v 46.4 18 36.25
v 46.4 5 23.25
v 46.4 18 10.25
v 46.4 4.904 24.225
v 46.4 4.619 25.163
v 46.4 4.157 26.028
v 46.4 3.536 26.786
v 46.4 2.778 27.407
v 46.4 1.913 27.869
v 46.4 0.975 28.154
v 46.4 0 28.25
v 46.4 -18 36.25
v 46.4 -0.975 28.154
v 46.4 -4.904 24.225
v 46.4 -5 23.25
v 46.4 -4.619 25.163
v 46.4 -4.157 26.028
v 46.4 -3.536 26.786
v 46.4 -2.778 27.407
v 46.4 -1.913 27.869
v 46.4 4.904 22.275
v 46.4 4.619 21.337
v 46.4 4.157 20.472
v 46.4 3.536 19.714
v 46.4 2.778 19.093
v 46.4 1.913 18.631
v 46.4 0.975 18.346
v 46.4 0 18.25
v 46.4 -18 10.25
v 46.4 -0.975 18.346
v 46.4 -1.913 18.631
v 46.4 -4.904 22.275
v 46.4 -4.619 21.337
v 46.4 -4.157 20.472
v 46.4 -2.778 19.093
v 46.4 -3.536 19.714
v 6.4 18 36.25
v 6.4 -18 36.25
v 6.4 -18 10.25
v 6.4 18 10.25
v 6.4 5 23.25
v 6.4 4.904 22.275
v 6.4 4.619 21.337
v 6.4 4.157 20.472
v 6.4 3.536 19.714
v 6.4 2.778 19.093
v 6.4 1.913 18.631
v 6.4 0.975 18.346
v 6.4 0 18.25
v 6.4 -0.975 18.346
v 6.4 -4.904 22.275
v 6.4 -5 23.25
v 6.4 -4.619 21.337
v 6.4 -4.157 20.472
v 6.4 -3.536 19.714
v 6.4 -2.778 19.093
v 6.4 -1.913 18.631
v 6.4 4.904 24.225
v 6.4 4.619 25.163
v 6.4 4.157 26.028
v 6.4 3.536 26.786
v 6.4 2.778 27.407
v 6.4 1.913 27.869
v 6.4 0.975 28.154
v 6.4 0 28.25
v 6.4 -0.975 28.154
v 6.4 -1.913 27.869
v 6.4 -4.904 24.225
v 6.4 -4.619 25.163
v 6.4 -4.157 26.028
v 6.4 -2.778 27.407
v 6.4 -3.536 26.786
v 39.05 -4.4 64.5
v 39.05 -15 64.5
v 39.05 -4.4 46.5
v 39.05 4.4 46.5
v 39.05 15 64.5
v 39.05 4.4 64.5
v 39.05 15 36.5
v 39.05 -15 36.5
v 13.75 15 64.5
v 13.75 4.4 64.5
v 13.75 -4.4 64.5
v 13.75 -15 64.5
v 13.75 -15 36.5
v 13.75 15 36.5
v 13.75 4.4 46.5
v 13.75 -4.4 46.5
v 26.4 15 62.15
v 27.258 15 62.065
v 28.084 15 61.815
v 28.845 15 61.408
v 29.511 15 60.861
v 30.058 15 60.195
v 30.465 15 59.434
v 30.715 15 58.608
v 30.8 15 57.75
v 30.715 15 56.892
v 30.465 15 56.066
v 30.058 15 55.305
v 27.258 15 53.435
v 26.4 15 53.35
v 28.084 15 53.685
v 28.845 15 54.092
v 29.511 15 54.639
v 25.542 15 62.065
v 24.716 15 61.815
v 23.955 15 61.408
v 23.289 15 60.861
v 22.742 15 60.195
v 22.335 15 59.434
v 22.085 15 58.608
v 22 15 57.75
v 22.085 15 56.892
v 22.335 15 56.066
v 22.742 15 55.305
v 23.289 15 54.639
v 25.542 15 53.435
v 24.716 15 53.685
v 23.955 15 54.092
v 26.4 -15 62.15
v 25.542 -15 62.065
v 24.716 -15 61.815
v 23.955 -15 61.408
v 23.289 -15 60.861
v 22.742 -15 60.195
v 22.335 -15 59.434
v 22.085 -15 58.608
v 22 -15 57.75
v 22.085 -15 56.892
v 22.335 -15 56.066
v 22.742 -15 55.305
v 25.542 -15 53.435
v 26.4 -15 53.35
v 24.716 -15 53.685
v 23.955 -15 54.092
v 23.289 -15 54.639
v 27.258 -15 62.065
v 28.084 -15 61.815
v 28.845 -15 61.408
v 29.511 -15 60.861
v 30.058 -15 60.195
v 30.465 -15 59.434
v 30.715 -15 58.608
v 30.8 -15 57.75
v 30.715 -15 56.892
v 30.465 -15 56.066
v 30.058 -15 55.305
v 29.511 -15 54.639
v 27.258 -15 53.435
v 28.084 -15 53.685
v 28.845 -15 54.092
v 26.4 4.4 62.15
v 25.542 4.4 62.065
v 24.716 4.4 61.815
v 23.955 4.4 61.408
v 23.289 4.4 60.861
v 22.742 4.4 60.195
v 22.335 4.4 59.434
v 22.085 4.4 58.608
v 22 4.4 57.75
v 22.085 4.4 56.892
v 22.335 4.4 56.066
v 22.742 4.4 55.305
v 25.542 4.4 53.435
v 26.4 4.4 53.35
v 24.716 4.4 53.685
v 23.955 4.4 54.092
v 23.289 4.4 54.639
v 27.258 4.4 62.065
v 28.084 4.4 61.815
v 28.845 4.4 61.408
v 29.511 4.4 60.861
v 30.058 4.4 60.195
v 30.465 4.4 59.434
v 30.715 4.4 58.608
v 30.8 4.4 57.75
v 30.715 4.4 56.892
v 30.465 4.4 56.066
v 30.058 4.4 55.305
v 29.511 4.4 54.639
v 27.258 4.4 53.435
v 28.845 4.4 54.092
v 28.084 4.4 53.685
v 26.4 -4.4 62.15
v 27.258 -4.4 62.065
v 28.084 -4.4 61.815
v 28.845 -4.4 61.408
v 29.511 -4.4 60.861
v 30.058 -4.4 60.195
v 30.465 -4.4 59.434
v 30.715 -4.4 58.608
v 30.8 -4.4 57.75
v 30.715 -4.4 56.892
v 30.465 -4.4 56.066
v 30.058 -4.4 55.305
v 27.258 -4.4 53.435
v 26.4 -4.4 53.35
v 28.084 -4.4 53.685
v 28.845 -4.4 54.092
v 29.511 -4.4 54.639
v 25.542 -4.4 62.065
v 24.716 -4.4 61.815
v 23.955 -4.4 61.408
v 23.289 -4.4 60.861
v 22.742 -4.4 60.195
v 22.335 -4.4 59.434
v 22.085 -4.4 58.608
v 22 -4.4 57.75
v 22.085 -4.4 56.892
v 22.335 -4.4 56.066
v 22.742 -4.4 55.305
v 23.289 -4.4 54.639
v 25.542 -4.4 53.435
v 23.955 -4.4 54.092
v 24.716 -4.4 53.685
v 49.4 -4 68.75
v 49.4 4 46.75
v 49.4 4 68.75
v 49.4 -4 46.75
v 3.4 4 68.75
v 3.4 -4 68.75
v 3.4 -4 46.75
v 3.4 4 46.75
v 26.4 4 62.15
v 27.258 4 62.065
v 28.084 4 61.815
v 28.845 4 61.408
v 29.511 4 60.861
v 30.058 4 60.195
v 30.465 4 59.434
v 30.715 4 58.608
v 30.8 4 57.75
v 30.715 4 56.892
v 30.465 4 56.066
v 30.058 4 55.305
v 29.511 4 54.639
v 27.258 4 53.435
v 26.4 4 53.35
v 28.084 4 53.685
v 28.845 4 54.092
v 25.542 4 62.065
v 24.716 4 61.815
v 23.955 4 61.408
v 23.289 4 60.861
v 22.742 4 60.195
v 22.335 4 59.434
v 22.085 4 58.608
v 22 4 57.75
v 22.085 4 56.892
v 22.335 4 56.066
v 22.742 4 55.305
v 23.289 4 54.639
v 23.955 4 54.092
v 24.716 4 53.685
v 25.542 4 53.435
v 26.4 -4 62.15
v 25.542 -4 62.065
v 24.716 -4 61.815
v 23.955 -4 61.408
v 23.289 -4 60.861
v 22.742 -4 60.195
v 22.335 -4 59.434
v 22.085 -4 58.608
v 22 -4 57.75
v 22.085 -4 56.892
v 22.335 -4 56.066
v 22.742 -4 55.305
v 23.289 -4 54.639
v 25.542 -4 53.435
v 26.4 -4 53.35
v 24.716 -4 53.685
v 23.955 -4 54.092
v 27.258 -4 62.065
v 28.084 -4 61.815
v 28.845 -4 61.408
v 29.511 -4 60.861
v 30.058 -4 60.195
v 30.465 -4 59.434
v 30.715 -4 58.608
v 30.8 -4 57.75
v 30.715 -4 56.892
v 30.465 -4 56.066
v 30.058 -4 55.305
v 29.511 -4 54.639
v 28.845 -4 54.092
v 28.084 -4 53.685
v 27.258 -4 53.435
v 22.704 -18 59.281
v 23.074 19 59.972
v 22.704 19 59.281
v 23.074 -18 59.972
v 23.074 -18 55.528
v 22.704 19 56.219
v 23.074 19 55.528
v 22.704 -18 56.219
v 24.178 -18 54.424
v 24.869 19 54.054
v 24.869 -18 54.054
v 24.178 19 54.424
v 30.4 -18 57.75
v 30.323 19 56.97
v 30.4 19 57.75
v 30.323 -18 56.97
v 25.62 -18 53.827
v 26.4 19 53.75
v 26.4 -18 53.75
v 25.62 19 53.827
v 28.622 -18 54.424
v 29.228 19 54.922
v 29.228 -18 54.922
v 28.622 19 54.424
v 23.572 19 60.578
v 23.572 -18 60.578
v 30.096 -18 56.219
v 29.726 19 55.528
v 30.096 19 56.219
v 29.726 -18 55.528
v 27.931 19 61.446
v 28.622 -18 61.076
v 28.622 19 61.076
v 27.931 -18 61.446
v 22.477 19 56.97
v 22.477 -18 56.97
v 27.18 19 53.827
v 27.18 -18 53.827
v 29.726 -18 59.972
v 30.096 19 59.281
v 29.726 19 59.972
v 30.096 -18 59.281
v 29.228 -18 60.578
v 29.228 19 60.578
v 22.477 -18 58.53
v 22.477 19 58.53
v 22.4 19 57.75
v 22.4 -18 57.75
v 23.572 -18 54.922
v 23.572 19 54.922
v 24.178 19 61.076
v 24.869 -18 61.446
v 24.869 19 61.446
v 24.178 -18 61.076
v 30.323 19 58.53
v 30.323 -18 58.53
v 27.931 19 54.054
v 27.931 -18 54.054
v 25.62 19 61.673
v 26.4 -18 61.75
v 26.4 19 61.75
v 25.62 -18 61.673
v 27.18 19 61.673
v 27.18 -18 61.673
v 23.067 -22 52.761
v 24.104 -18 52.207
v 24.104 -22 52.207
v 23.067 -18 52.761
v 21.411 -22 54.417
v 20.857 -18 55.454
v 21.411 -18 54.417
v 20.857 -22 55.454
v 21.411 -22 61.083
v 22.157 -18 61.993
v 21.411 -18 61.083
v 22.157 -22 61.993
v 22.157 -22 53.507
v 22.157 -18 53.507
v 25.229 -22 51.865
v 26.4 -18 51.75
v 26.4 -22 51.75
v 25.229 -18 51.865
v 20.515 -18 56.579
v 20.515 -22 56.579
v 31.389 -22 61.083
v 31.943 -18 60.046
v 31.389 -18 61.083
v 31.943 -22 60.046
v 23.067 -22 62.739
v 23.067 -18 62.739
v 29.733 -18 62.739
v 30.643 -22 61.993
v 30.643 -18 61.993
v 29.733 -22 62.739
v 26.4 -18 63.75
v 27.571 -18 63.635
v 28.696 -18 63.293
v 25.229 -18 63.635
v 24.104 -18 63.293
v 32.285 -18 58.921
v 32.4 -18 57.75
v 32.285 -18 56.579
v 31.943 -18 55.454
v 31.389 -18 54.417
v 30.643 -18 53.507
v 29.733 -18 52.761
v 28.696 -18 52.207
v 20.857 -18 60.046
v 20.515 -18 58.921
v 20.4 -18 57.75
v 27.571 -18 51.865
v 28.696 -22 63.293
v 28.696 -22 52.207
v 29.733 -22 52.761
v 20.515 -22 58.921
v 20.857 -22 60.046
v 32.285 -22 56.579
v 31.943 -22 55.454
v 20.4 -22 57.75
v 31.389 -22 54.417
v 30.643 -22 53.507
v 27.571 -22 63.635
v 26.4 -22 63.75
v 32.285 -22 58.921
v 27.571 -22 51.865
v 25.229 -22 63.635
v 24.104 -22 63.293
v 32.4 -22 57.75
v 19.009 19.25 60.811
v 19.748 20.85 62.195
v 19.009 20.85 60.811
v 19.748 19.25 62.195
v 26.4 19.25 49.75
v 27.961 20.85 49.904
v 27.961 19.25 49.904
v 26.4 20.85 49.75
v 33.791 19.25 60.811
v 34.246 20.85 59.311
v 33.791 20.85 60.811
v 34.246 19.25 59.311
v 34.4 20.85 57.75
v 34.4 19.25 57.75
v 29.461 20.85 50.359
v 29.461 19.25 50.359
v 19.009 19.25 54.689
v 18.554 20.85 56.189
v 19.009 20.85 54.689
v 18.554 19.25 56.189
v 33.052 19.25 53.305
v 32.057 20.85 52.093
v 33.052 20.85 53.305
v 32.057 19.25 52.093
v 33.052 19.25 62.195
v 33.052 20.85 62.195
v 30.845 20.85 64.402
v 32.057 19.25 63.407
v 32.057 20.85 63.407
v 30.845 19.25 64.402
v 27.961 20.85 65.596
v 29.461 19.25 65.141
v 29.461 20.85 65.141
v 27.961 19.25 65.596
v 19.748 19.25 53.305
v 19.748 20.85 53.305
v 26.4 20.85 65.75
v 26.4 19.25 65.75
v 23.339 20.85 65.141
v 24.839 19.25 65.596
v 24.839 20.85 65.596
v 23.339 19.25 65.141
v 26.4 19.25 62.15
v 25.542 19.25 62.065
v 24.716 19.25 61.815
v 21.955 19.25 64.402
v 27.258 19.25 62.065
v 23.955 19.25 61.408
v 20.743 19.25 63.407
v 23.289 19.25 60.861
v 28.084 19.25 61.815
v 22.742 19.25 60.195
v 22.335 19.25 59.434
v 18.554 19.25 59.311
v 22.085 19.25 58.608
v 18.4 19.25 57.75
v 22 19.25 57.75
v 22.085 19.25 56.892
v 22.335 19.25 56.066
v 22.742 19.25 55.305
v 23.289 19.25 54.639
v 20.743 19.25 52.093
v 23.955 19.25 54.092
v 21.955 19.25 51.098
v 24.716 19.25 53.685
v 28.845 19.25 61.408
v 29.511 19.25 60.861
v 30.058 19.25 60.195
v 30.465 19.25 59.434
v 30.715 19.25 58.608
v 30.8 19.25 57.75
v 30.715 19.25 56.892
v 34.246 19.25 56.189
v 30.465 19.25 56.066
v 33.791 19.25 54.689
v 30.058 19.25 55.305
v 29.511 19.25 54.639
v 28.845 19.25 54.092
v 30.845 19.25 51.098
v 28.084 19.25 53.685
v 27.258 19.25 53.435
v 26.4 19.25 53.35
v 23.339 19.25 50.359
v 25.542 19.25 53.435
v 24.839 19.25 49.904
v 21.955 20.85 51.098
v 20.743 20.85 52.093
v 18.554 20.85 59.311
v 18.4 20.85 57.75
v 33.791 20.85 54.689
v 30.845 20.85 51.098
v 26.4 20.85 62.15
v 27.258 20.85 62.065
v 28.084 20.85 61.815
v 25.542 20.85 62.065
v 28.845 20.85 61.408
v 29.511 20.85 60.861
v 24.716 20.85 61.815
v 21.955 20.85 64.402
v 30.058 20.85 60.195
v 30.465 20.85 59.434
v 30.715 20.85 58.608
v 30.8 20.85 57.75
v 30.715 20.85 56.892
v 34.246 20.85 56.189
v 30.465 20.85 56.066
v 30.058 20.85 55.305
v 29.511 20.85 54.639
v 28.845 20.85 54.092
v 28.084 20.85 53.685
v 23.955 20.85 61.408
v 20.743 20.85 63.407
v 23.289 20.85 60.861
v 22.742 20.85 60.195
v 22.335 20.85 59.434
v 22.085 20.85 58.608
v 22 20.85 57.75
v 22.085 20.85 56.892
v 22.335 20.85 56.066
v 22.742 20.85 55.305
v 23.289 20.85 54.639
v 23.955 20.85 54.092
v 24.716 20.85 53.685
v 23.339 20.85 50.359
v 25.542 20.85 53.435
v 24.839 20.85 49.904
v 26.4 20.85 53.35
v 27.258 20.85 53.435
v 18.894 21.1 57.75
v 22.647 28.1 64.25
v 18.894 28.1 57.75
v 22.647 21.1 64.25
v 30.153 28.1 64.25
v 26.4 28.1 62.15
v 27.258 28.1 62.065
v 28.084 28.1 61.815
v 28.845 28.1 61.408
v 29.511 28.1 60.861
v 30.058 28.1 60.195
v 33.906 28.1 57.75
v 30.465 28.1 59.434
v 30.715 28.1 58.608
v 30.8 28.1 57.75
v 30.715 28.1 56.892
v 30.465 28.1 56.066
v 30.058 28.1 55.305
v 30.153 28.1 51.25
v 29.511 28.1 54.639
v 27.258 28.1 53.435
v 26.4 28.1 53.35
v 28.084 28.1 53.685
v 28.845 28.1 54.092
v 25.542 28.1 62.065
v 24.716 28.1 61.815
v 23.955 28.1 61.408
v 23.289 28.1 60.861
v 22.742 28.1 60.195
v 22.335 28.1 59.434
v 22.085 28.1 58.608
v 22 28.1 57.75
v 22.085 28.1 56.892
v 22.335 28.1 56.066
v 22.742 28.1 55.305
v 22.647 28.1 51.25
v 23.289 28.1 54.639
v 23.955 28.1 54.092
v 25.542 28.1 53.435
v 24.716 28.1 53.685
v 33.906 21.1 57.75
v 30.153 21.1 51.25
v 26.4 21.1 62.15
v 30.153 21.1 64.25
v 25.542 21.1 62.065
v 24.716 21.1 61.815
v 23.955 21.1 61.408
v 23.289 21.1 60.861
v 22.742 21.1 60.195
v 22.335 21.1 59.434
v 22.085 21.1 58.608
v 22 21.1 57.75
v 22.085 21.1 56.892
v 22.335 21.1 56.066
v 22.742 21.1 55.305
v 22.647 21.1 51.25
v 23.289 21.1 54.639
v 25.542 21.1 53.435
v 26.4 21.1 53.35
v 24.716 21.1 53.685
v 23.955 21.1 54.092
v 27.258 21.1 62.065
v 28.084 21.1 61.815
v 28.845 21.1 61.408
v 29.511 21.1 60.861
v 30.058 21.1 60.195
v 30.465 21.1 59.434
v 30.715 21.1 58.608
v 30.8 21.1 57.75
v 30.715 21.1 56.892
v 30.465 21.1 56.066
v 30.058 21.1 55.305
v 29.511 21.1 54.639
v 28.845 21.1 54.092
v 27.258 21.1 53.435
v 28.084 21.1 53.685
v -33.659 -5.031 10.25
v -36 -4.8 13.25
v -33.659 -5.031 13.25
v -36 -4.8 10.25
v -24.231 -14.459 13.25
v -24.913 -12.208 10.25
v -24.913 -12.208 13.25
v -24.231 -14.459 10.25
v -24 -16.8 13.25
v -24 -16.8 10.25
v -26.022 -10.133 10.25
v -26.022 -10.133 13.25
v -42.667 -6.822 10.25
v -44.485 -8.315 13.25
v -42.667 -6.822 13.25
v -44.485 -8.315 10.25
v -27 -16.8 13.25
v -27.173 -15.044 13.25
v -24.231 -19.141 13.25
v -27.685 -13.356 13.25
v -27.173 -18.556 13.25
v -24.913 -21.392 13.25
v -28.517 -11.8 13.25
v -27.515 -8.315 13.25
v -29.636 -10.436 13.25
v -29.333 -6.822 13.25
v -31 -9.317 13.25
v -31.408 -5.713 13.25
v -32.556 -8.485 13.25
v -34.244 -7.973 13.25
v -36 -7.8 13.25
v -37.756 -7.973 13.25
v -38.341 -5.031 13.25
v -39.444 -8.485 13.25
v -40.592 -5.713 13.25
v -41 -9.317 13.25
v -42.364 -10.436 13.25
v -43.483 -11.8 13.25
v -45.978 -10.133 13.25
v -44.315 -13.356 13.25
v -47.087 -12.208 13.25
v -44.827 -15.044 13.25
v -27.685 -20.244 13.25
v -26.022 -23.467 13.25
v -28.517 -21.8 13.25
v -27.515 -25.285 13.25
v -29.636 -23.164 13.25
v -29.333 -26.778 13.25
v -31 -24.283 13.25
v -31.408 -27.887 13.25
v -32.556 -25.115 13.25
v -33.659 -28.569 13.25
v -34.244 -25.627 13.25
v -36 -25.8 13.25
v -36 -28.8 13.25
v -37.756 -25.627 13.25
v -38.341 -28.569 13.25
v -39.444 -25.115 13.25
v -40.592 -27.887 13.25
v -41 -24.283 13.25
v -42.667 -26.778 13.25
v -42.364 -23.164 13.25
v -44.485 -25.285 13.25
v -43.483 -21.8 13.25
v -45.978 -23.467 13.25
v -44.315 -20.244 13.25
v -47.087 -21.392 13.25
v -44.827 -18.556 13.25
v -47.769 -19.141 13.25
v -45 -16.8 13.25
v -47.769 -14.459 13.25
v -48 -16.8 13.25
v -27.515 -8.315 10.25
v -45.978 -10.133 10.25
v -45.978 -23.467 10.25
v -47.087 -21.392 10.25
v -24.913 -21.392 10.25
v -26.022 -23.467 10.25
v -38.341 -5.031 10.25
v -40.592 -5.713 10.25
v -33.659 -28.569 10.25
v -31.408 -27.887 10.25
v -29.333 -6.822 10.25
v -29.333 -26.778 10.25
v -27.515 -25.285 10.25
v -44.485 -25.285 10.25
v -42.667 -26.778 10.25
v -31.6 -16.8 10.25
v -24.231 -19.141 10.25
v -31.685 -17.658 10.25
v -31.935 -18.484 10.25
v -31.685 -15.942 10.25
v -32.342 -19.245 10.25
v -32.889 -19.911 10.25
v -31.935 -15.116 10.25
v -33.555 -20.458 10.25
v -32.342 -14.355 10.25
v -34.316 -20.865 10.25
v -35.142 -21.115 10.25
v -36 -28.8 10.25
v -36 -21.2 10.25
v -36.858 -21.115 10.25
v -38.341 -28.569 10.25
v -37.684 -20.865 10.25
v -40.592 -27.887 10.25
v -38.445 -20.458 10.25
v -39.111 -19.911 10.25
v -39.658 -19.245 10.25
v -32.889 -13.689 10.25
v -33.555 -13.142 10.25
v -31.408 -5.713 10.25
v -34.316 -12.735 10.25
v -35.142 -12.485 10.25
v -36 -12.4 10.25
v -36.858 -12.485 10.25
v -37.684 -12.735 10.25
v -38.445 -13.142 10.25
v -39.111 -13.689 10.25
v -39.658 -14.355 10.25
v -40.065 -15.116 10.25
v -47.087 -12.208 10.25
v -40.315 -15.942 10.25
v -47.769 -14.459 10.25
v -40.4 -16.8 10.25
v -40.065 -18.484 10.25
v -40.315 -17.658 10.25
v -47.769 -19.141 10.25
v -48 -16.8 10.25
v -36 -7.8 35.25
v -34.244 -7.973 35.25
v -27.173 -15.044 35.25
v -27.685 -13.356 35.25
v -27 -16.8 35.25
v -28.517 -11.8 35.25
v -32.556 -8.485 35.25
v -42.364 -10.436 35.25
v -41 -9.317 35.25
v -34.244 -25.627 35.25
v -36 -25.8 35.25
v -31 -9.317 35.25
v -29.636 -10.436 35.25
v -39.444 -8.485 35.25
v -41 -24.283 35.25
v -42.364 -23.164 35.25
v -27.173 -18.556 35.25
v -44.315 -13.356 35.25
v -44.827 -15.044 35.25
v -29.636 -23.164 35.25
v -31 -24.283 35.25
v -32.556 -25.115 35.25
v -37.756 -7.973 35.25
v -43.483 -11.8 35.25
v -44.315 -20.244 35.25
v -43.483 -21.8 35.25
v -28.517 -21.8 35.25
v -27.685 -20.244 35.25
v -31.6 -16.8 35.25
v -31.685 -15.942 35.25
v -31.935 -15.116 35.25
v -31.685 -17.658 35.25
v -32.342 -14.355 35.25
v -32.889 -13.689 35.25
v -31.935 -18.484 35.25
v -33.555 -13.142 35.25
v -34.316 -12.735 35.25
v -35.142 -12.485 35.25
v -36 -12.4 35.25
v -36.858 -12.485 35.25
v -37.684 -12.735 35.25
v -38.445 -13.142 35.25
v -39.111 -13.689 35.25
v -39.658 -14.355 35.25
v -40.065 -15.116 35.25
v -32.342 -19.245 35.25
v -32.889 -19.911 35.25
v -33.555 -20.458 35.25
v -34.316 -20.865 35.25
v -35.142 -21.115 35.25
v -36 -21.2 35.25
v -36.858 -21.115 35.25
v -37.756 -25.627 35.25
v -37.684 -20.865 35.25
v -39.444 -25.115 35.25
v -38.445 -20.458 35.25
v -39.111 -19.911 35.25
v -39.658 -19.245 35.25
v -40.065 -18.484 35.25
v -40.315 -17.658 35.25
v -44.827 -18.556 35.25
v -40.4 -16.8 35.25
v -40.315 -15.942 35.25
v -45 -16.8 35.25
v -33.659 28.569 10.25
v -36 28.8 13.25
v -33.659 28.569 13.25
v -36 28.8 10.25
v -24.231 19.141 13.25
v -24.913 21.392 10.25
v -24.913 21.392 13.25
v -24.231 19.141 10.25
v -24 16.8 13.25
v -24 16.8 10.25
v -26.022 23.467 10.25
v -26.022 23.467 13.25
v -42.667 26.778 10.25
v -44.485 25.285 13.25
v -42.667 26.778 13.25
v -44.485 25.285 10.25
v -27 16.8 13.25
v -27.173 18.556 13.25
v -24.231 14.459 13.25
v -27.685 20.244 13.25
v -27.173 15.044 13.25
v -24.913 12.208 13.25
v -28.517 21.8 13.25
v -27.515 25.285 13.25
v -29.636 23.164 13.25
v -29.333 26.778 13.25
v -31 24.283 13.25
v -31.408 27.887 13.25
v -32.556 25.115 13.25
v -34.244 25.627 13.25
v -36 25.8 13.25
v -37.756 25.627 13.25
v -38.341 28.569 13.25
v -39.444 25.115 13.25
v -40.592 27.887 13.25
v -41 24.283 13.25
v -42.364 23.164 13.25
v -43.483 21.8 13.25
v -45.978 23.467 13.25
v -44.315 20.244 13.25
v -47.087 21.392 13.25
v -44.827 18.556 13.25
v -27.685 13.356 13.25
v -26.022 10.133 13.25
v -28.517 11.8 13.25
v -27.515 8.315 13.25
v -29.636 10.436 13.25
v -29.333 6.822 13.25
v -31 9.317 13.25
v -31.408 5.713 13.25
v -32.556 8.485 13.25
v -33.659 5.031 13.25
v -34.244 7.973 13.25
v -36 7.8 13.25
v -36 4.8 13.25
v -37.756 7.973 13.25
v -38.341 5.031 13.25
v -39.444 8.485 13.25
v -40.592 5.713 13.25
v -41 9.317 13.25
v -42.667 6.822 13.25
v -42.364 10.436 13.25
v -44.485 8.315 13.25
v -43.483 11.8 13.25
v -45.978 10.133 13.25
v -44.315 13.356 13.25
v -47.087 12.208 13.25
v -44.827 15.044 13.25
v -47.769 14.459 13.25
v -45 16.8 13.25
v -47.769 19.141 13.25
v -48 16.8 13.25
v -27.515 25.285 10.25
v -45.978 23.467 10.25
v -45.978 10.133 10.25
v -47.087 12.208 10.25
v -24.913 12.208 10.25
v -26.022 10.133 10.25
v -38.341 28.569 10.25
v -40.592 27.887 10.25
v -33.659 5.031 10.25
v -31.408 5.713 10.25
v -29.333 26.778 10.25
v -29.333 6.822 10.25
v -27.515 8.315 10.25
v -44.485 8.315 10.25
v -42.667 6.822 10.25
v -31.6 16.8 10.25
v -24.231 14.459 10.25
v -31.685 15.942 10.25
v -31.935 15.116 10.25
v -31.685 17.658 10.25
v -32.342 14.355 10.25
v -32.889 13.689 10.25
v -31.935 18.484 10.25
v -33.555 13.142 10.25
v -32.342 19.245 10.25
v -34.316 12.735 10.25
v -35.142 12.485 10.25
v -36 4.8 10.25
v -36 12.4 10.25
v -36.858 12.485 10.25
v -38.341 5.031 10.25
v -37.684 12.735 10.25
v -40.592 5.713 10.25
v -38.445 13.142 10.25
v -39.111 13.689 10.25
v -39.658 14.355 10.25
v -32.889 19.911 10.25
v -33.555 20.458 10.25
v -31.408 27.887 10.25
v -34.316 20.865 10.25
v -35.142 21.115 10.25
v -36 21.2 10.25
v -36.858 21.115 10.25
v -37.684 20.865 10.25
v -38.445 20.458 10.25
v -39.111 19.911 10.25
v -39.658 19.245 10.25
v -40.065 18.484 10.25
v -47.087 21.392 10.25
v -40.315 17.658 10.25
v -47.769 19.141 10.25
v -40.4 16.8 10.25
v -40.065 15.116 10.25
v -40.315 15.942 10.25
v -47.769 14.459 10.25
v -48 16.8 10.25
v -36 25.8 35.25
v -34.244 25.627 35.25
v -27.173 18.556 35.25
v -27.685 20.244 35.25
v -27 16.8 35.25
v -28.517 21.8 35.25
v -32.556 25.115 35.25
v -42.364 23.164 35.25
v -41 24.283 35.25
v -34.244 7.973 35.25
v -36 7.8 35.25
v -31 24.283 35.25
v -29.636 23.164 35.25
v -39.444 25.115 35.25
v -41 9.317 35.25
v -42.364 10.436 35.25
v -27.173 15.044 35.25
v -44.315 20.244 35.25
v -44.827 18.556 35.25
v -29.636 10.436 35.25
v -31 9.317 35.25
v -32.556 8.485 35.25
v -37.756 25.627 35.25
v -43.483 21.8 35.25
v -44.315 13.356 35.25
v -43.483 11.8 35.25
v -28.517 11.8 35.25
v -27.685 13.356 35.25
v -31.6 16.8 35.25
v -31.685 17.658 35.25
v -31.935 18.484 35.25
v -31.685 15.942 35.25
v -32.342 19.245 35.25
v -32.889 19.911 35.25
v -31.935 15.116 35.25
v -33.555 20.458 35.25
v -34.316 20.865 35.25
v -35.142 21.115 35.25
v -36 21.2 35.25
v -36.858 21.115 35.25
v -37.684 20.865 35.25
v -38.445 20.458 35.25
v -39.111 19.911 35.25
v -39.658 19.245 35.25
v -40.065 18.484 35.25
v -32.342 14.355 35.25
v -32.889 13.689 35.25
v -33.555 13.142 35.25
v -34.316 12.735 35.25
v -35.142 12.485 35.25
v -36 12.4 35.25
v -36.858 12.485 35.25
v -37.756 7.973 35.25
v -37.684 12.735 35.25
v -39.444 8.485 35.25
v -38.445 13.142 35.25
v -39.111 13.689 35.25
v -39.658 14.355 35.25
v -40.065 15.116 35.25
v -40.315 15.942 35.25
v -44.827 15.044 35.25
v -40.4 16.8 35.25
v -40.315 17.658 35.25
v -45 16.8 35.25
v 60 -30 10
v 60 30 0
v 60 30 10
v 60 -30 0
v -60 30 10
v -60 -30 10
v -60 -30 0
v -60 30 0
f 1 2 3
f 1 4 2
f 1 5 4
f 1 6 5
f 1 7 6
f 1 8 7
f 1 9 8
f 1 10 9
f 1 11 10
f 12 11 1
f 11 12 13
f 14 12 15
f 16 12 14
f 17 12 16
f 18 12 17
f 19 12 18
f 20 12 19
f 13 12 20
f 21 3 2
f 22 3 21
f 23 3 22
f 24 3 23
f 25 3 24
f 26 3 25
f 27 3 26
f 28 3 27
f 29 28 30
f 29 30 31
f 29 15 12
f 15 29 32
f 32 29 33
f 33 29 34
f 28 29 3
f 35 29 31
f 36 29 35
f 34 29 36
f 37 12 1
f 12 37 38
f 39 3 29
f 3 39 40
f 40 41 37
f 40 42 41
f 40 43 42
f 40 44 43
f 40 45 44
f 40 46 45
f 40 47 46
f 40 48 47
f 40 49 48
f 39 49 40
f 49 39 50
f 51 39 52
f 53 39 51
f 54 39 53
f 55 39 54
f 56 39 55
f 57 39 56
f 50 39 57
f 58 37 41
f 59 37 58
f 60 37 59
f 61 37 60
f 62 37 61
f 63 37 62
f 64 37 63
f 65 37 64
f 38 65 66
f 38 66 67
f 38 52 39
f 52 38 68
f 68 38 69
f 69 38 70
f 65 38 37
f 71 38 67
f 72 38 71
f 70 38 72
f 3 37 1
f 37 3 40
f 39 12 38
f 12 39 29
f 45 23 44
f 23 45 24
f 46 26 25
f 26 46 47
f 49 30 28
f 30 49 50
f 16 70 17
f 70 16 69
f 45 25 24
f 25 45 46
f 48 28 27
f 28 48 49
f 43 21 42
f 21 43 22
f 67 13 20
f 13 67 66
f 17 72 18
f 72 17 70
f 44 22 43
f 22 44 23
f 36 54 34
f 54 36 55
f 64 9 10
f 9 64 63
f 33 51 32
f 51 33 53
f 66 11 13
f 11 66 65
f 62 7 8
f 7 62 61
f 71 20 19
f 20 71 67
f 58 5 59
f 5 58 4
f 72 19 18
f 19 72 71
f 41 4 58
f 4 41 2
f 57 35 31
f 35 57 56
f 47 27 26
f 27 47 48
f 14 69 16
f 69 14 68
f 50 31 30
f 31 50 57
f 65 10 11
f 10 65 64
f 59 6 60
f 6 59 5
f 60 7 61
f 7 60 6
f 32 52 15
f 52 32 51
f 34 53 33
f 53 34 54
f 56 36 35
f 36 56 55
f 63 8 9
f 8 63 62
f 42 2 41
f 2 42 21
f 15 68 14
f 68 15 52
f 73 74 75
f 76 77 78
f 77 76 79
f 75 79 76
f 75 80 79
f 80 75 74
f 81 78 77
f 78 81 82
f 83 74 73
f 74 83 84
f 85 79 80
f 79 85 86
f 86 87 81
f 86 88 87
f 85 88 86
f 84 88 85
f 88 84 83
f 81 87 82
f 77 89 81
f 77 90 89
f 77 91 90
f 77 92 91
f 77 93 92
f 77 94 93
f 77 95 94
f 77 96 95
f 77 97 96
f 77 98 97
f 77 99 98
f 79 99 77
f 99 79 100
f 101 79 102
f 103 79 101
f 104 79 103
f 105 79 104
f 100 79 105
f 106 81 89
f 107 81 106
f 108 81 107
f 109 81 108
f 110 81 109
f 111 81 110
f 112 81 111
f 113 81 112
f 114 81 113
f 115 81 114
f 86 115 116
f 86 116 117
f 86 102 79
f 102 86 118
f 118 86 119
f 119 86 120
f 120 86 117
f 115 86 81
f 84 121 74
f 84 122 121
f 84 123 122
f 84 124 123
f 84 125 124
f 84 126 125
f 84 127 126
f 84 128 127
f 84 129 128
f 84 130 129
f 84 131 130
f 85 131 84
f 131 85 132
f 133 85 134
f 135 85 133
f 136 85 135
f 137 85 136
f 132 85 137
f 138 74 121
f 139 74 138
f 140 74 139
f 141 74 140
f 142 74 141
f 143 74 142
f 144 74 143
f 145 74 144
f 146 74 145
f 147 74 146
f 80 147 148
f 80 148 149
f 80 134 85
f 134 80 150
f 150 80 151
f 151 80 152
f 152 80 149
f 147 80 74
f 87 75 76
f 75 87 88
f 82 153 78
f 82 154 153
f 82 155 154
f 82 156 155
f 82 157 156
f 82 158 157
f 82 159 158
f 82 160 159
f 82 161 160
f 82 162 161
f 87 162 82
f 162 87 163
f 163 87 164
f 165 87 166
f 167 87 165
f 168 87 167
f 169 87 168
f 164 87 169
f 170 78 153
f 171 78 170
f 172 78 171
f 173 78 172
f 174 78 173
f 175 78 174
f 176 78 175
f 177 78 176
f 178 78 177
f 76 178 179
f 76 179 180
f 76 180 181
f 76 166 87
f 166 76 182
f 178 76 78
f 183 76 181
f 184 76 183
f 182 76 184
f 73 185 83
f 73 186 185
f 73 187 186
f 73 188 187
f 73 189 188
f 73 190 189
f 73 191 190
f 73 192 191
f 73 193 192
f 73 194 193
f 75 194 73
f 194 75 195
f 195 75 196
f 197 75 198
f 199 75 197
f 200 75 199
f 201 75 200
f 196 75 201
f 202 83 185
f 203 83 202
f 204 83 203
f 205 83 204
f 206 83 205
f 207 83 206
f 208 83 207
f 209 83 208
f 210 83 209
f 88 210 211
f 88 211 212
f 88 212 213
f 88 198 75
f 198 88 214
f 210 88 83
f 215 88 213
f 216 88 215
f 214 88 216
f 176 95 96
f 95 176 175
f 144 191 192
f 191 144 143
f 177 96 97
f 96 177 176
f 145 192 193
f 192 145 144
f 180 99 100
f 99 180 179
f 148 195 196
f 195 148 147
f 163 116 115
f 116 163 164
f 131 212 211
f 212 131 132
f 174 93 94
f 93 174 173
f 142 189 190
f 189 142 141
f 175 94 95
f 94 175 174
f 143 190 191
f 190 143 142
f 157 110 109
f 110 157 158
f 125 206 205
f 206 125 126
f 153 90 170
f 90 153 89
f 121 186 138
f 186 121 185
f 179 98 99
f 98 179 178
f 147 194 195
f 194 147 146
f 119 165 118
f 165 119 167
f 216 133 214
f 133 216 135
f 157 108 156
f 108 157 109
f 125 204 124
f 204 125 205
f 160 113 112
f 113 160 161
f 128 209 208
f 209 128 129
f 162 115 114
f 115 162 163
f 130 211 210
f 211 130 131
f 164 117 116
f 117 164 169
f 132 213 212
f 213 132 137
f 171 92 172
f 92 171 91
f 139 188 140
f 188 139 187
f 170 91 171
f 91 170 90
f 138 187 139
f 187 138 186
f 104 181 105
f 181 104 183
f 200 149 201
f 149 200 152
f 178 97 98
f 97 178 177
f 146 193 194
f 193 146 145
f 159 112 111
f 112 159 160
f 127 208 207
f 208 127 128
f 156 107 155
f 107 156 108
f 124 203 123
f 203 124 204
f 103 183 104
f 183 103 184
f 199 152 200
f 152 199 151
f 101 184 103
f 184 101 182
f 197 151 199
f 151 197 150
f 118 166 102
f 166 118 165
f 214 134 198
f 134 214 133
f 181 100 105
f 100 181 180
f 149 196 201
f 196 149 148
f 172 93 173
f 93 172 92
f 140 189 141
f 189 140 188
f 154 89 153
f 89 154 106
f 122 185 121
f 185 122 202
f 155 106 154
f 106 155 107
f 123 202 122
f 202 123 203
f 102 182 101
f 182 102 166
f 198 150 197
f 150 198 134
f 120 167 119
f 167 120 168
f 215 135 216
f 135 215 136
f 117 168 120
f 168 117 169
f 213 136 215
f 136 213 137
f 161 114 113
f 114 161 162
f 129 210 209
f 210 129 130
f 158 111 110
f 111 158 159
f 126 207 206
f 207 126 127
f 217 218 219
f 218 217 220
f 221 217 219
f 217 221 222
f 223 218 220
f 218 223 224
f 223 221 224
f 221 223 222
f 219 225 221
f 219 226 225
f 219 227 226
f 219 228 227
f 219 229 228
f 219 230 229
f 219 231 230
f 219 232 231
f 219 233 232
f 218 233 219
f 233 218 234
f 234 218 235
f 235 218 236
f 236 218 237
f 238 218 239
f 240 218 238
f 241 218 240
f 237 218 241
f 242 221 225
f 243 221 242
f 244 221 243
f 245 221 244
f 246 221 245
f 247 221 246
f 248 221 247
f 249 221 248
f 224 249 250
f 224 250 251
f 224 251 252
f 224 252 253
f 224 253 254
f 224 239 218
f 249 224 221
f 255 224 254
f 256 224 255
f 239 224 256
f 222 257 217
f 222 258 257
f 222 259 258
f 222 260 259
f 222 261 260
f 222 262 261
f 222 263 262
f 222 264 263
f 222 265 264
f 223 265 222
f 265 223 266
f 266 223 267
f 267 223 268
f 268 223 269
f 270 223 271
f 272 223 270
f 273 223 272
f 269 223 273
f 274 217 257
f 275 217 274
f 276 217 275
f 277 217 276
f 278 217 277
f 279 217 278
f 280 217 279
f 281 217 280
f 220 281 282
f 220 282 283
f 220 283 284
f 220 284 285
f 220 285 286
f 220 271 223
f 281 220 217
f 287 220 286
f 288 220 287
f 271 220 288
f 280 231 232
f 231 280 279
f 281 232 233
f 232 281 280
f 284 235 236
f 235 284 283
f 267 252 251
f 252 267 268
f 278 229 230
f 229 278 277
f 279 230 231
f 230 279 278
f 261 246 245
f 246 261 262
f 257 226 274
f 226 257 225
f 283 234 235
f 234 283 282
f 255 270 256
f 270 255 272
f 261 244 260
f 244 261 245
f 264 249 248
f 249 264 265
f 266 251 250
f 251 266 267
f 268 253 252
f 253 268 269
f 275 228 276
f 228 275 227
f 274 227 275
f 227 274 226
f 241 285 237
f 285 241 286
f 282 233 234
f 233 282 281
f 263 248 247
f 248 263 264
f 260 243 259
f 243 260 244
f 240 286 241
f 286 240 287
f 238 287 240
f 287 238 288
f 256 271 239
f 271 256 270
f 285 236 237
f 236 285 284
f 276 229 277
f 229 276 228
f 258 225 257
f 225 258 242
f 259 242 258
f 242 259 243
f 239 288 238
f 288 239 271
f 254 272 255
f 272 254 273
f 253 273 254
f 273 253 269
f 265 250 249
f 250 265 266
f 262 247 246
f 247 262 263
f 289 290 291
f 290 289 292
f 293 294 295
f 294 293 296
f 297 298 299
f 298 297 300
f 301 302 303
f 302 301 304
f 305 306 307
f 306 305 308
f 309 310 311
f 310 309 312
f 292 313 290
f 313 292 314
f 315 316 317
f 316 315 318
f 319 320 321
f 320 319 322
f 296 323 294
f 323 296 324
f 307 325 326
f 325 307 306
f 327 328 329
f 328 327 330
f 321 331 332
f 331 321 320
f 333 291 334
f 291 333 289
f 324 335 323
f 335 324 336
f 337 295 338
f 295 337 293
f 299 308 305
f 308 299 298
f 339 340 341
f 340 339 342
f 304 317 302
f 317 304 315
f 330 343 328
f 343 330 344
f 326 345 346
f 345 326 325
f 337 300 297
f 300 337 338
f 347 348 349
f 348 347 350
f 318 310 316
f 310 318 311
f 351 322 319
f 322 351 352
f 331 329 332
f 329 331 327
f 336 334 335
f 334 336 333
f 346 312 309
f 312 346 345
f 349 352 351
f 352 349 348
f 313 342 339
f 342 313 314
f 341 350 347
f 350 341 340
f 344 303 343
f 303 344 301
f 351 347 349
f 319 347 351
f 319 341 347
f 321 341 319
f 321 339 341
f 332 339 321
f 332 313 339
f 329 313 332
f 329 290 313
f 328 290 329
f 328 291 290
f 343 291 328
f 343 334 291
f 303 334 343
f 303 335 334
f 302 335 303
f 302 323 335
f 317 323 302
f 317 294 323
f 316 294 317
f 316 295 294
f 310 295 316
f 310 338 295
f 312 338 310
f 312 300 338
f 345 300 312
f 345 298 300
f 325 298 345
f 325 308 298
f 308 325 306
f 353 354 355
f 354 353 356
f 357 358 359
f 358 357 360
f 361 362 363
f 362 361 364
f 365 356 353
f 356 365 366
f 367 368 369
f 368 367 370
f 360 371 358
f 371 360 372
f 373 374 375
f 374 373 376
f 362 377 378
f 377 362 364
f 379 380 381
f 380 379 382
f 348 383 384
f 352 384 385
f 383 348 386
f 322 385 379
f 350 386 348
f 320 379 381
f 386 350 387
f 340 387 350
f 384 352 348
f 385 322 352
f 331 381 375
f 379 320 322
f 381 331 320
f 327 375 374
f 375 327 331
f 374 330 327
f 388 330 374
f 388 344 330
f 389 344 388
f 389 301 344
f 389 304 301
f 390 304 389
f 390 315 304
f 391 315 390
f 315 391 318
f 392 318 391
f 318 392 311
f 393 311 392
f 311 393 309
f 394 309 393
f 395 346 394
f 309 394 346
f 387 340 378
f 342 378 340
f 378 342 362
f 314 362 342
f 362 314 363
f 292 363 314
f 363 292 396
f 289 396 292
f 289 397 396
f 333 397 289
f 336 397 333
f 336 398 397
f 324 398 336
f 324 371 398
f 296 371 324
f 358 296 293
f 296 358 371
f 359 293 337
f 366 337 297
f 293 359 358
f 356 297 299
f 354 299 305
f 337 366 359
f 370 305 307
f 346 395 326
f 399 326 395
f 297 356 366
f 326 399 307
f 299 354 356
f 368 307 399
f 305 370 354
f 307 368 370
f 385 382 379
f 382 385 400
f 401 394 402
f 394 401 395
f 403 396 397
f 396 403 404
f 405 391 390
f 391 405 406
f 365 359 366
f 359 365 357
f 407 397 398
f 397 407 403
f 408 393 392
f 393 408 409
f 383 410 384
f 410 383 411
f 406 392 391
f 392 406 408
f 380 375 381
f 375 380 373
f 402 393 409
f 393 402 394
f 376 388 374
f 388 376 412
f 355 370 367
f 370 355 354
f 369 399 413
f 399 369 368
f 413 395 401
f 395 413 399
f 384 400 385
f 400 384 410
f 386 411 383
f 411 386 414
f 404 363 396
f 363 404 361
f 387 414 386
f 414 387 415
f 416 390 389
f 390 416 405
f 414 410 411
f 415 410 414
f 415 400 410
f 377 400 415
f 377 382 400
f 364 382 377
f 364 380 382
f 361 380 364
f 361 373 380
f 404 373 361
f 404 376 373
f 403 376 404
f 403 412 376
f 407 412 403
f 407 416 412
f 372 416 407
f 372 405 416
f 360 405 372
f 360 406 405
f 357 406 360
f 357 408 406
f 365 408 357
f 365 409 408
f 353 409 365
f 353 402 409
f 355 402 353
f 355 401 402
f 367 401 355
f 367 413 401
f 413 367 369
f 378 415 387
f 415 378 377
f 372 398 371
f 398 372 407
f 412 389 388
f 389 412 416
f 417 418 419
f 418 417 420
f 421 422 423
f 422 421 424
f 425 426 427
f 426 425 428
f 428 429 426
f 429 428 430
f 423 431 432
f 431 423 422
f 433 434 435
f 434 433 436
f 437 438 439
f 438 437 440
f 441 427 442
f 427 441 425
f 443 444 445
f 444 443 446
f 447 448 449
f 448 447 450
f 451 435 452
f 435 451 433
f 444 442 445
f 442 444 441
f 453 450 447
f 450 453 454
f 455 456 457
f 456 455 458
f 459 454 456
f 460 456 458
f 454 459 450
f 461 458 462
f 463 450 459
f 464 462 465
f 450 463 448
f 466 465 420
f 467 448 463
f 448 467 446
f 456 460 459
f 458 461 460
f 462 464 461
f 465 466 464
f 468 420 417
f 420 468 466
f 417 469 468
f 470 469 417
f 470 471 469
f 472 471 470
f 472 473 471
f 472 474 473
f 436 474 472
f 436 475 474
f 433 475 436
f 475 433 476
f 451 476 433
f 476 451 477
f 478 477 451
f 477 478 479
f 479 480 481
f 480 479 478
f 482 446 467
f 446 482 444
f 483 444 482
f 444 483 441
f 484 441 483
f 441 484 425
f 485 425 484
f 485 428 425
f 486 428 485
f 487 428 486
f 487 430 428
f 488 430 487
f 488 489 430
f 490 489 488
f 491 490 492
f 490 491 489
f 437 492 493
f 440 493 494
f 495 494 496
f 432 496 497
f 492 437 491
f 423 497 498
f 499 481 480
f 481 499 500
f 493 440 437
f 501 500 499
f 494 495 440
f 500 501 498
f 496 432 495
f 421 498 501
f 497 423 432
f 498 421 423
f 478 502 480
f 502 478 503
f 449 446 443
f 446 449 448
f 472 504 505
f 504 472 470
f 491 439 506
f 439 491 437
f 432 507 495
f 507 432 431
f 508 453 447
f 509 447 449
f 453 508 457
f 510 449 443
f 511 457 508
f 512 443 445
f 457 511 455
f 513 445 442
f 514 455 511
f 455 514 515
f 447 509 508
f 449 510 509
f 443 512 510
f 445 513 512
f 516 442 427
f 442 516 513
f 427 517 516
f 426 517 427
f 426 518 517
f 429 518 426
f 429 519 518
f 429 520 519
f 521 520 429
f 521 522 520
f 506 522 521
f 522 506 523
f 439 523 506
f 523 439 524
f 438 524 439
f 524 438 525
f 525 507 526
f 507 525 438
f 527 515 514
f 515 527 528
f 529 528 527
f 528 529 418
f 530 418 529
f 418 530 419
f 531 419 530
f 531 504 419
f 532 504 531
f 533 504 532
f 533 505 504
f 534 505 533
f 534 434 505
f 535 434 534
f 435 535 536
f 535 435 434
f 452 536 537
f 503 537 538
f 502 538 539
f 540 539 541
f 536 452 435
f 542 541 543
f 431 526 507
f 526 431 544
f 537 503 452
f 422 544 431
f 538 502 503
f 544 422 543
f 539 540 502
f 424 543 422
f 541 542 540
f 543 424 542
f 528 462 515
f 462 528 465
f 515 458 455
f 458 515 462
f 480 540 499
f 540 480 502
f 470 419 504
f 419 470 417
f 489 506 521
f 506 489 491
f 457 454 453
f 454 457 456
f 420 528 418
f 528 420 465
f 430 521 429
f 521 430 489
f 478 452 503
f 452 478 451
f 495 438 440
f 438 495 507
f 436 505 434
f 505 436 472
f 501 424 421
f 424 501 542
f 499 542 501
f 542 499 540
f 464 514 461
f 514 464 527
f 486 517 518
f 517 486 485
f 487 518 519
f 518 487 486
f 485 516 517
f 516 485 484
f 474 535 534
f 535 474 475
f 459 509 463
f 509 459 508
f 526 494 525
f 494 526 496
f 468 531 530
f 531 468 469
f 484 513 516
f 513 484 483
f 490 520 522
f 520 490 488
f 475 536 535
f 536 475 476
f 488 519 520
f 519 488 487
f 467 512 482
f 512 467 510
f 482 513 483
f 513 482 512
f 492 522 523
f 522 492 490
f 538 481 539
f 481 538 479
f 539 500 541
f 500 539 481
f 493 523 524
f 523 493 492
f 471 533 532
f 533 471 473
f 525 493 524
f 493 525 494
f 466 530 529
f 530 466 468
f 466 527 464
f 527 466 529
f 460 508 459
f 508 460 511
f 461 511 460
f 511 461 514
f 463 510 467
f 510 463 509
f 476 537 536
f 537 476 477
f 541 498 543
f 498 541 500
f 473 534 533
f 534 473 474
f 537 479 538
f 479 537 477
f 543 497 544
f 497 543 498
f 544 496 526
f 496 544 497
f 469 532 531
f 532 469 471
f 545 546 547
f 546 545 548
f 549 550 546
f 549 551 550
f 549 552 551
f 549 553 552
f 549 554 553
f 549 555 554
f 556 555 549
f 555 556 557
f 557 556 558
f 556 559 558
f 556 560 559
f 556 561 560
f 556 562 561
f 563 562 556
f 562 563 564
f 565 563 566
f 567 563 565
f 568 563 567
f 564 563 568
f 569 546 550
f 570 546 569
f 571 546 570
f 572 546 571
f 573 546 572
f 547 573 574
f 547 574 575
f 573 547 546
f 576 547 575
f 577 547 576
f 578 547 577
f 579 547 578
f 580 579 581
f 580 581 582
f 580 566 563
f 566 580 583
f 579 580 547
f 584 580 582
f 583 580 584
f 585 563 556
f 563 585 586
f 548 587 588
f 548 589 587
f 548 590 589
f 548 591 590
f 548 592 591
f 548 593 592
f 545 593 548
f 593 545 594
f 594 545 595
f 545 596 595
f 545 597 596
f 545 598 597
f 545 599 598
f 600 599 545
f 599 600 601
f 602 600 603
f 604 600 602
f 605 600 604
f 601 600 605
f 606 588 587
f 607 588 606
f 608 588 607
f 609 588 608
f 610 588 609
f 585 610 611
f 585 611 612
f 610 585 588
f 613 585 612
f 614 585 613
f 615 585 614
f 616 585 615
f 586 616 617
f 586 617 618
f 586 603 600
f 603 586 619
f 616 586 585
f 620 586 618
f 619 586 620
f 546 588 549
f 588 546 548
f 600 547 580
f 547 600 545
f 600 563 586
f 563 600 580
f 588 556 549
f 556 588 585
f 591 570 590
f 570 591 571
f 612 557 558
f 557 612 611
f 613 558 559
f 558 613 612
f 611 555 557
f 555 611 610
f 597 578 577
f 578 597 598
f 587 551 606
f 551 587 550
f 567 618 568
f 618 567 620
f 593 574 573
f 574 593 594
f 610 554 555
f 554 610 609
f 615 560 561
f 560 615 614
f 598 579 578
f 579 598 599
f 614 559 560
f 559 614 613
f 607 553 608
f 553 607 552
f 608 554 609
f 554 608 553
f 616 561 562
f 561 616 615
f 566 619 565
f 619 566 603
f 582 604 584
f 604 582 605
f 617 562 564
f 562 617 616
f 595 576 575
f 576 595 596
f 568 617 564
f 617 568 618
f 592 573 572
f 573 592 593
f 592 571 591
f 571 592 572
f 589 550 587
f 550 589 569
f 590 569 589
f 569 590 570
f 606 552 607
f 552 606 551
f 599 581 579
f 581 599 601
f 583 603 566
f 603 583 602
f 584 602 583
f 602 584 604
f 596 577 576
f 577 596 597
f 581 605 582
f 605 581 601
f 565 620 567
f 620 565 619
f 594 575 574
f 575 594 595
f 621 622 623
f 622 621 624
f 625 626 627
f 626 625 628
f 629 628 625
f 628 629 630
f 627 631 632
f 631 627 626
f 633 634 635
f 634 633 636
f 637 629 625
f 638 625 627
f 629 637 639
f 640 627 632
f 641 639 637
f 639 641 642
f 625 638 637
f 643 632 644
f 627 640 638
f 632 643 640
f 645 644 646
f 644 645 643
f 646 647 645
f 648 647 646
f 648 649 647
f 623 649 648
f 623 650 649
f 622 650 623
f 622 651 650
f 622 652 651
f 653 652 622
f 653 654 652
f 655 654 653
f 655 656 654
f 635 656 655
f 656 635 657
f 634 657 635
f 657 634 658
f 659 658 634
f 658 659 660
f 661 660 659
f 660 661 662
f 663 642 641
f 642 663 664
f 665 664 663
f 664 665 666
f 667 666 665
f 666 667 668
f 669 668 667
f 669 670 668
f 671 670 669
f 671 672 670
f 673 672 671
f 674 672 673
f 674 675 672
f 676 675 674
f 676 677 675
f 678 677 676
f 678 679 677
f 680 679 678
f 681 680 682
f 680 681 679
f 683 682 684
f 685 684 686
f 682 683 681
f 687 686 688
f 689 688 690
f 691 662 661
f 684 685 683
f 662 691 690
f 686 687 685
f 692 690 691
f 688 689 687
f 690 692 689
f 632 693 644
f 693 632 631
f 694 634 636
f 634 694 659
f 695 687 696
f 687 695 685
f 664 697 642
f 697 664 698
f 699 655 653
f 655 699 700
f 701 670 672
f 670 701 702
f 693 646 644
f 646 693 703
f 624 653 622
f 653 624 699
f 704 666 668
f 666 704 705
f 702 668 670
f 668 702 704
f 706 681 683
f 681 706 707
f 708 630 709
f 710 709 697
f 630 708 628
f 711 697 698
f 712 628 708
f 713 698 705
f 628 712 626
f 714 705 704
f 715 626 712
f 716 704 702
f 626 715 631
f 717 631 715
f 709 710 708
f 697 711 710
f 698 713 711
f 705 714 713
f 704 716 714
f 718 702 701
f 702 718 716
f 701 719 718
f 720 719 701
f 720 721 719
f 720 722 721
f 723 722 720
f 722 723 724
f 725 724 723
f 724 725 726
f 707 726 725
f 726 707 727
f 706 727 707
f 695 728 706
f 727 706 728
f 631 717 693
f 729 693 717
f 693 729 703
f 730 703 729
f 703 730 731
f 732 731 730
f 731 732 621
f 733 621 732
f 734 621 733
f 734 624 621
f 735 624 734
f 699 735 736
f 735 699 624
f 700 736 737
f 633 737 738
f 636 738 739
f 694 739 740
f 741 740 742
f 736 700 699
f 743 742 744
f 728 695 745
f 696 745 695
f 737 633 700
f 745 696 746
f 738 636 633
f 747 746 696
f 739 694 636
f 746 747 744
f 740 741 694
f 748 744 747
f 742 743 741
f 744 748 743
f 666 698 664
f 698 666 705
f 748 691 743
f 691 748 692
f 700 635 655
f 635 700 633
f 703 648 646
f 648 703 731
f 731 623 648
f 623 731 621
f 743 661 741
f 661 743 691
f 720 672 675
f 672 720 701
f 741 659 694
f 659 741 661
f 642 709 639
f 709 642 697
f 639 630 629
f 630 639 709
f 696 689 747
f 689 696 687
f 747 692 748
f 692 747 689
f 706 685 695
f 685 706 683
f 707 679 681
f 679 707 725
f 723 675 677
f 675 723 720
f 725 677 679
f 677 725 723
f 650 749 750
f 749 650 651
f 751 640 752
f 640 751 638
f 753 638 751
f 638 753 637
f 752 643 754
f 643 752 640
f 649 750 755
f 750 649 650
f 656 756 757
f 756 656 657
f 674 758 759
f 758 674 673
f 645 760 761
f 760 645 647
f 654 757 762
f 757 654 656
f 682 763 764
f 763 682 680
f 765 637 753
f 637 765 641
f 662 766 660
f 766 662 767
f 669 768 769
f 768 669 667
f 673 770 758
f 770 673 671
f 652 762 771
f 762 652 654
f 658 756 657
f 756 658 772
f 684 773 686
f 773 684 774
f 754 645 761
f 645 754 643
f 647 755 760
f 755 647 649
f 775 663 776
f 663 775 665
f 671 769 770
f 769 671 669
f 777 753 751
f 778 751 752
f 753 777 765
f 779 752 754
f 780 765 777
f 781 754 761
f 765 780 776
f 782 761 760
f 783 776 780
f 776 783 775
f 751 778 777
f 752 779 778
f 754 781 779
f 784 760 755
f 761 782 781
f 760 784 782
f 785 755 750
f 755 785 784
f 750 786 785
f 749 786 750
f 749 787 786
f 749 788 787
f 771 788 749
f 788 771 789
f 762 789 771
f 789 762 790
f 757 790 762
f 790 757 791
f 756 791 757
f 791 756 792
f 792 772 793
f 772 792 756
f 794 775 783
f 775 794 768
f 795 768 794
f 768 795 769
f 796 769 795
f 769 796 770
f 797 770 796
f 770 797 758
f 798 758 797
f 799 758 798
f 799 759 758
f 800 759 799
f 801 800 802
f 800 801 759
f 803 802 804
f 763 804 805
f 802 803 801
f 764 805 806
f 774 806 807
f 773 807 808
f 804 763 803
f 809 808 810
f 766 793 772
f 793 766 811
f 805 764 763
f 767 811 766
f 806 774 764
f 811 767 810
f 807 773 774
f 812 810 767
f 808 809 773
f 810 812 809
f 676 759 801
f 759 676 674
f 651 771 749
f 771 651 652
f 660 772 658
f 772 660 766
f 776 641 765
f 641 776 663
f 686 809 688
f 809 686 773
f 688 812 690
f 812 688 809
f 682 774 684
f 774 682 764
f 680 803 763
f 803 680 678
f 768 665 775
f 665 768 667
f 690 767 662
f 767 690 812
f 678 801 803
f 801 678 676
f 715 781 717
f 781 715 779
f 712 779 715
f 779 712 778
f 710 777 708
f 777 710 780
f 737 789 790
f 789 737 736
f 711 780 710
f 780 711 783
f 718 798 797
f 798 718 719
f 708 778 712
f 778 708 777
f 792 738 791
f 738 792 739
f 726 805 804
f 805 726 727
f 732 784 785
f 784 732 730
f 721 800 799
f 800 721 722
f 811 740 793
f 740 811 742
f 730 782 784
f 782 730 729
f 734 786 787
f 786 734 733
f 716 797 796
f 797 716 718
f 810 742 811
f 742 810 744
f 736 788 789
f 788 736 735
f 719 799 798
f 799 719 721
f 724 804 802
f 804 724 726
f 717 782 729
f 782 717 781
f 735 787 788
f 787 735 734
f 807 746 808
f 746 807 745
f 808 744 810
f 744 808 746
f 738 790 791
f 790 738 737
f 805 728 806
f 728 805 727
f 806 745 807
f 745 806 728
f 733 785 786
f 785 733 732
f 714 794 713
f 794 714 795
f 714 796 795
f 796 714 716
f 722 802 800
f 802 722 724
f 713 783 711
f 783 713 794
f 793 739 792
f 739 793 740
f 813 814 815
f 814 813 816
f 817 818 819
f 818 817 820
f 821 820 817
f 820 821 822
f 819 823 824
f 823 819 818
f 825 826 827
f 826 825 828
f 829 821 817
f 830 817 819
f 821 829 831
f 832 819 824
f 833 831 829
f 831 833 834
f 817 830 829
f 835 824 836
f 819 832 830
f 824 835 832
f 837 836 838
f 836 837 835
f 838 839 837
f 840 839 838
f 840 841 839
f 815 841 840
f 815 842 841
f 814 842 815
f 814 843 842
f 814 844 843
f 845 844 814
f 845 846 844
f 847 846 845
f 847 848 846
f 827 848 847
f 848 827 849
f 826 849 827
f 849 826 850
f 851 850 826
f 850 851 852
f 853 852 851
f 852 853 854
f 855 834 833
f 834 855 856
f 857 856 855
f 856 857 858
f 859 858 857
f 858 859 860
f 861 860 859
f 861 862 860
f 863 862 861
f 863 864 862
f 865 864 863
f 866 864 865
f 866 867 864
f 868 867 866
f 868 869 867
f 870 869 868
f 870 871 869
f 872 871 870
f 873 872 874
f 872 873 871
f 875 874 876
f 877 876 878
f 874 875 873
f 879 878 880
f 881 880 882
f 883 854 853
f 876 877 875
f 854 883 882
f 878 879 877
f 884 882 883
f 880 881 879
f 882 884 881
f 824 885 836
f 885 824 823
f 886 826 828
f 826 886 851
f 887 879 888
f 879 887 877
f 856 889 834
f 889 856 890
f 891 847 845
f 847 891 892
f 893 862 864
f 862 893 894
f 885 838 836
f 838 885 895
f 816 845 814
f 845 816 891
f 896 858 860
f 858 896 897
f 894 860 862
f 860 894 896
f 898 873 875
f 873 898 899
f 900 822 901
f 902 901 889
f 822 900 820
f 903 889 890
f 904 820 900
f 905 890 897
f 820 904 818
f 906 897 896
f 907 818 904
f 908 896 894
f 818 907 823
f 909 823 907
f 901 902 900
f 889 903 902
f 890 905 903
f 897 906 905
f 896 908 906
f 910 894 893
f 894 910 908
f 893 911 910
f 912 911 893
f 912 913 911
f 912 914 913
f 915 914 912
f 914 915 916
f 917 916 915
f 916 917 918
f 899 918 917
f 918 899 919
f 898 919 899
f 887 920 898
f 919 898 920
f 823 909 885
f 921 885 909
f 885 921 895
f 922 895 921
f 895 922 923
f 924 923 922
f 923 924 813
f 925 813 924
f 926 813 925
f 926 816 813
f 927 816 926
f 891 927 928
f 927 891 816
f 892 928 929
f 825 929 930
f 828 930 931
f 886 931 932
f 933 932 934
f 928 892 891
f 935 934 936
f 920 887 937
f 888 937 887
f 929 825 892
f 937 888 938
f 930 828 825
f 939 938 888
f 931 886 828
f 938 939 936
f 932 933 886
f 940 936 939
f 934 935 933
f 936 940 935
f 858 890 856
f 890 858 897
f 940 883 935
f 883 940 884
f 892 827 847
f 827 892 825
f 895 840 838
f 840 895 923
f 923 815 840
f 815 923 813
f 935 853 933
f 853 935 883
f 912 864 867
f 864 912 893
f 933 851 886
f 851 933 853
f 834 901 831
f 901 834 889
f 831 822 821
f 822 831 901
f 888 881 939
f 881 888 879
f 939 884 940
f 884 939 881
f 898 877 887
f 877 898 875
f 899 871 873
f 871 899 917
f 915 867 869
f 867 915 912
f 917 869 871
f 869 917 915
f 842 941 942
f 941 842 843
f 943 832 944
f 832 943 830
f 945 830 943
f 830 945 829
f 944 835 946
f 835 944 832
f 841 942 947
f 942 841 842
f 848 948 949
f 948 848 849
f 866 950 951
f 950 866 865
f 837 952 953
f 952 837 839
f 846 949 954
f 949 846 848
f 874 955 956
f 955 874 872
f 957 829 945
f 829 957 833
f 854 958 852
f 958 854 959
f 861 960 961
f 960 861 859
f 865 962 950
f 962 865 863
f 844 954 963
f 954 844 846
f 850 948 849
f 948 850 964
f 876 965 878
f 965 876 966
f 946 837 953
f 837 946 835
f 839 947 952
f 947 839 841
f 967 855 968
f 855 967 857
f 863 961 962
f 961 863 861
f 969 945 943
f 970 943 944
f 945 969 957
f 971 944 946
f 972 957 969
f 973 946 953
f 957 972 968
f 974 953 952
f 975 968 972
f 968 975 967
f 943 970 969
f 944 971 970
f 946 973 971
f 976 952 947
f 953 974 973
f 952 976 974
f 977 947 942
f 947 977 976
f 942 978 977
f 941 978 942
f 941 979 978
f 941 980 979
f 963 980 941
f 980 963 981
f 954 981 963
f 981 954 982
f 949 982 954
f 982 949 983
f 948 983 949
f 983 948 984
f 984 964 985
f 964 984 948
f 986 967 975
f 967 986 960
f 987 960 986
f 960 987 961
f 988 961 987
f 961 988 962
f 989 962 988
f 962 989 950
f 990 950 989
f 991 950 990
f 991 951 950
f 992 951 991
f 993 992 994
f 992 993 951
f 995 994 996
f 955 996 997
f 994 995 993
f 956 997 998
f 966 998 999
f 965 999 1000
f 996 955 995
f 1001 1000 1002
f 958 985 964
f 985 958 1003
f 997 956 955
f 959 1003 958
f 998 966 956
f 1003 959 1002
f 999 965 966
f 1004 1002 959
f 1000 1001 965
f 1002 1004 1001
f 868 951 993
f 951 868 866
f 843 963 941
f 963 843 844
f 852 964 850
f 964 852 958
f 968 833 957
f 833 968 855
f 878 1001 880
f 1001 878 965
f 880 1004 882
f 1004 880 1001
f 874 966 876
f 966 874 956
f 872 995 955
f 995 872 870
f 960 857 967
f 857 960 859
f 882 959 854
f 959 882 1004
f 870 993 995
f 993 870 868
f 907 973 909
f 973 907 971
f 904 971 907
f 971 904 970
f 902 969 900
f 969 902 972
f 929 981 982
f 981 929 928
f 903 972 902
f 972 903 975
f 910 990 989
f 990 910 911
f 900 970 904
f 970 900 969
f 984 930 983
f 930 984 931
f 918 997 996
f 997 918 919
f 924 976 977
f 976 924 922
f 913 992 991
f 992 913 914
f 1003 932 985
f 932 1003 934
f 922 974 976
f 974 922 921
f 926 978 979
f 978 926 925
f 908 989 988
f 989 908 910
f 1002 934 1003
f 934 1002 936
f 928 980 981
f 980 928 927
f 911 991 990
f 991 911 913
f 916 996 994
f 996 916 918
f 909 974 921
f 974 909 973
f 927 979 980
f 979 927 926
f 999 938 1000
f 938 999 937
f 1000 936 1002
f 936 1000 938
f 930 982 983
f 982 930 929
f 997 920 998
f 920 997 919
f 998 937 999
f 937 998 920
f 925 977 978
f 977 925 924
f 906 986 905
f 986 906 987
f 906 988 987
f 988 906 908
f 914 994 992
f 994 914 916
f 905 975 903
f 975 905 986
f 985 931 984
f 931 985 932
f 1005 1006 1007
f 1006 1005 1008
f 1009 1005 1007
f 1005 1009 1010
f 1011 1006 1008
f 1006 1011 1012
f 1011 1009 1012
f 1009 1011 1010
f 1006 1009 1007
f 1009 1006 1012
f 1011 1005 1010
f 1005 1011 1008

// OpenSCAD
$fn = 32;

// ------------------------------------------------------------------------
// Indexing jig: plate 120 x 60 mm, pin d8
// Every part is its own module, assembly() places every instance.
// ------------------------------------------------------------------------

// --- part 1 ---
module jig_plate() {
  difference() {
    translate([-60, -30, 0]) cube([120, 60, 10]);
  }
}

// --- part 2 ---
module locator_block() {
  difference() {
    translate([-20, -18, 0]) cube([40, 36, 26]);
    translate([0, 0, 13]) rotate([0, 90, 0]) cylinder(h = 42, d = 10, center = true);
  }
}

// --- part 3 ---
module index_fork() {
  difference() {
    translate([-12.65, -15, 0]) cube([25.3, 30, 28]);
    translate([-13.65, -4.4, 10]) cube([27.3, 8.8, 19]);
    translate([0, 0, 21.25]) rotate([90, 0, 0]) cylinder(h = 32, d = 8.8, center = true);
  }
}

// --- part 4 ---
module index_arm() {
  difference() {
    translate([-23, -4, 0]) cube([46, 8, 22]);
    translate([0, 0, 11]) rotate([90, 0, 0]) cylinder(h = 10, d = 8.8, center = true);
  }
}

// --- part 5 ---
module index_pin() {
  rotate([0, 90, 0]) cylinder(h = 38, d = 8, center = true);
  translate([-22, 0, 0]) rotate([0, 90, 0]) cylinder(h = 4, d = 12);
}

// --- part 6 ---
module pin_washer() {
  difference() {
      translate([0, 0, 0]) cylinder(h = 1.6, d = 16);
      translate([0, 0, -1]) cylinder(h = 3.6, d = 8.8);
    }
}

// --- part 7 ---
module lock_nut() {
  difference() {
    linear_extrude(height = 7) polygon(points = [[7.506, 0], [3.753, 6.5], [-3.753, 6.5], [-7.506, 0], [-3.753, -6.5], [3.753, -6.5]]);
    translate([0, 0, -1]) cylinder(h = 9, d = 8.8);
  }
}

// --- part 8 ---
module guide_bush_a() {
  difference() {
    union() {
      cylinder(h = 3, d = 24);
      translate([0, 0, 3]) cylinder(h = 22, d = 18);
    }
    translate([0, 0, -1]) cylinder(h = 27, d = 8.8);
  }
}

// --- part 9 ---
module guide_bush_b() {
  difference() {
    union() {
      cylinder(h = 3, d = 24);
      translate([0, 0, 3]) cylinder(h = 22, d = 18);
    }
    translate([0, 0, -1]) cylinder(h = 27, d = 8.8);
  }
}

// --- assembly ---
module assembly() {
  color([0.80, 0.24, 0.20]) translate([0, 0, 0]) rotate([0, 0, 0]) jig_plate();
  color([0.20, 0.45, 0.75]) translate([26.4, 0, 10.25]) rotate([0, 0, 0]) locator_block();
  color([0.25, 0.62, 0.32]) translate([26.4, 0, 36.5]) rotate([0, 0, 0]) index_fork();
  color([0.92, 0.70, 0.18]) translate([26.4, 0, 46.75]) rotate([0, 0, 0]) index_arm();
  color([0.58, 0.35, 0.70]) translate([26.4, 0, 57.75]) rotate([0, 0, 90]) index_pin();
  color([0.16, 0.66, 0.66]) translate([26.4, 20.85, 57.75]) rotate([90, 0, 0]) pin_washer();
  color([0.85, 0.48, 0.18]) translate([26.4, 28.1, 57.75]) rotate([90, 0, 0]) lock_nut();
  color([0.55, 0.60, 0.65]) translate([-36, -16.8, 10.25]) rotate([0, 0, 0]) guide_bush_a();
  color([0.75, 0.30, 0.55]) translate([-36, 16.8, 10.25]) rotate([0, 0, 0]) guide_bush_b();
}

assembly();
